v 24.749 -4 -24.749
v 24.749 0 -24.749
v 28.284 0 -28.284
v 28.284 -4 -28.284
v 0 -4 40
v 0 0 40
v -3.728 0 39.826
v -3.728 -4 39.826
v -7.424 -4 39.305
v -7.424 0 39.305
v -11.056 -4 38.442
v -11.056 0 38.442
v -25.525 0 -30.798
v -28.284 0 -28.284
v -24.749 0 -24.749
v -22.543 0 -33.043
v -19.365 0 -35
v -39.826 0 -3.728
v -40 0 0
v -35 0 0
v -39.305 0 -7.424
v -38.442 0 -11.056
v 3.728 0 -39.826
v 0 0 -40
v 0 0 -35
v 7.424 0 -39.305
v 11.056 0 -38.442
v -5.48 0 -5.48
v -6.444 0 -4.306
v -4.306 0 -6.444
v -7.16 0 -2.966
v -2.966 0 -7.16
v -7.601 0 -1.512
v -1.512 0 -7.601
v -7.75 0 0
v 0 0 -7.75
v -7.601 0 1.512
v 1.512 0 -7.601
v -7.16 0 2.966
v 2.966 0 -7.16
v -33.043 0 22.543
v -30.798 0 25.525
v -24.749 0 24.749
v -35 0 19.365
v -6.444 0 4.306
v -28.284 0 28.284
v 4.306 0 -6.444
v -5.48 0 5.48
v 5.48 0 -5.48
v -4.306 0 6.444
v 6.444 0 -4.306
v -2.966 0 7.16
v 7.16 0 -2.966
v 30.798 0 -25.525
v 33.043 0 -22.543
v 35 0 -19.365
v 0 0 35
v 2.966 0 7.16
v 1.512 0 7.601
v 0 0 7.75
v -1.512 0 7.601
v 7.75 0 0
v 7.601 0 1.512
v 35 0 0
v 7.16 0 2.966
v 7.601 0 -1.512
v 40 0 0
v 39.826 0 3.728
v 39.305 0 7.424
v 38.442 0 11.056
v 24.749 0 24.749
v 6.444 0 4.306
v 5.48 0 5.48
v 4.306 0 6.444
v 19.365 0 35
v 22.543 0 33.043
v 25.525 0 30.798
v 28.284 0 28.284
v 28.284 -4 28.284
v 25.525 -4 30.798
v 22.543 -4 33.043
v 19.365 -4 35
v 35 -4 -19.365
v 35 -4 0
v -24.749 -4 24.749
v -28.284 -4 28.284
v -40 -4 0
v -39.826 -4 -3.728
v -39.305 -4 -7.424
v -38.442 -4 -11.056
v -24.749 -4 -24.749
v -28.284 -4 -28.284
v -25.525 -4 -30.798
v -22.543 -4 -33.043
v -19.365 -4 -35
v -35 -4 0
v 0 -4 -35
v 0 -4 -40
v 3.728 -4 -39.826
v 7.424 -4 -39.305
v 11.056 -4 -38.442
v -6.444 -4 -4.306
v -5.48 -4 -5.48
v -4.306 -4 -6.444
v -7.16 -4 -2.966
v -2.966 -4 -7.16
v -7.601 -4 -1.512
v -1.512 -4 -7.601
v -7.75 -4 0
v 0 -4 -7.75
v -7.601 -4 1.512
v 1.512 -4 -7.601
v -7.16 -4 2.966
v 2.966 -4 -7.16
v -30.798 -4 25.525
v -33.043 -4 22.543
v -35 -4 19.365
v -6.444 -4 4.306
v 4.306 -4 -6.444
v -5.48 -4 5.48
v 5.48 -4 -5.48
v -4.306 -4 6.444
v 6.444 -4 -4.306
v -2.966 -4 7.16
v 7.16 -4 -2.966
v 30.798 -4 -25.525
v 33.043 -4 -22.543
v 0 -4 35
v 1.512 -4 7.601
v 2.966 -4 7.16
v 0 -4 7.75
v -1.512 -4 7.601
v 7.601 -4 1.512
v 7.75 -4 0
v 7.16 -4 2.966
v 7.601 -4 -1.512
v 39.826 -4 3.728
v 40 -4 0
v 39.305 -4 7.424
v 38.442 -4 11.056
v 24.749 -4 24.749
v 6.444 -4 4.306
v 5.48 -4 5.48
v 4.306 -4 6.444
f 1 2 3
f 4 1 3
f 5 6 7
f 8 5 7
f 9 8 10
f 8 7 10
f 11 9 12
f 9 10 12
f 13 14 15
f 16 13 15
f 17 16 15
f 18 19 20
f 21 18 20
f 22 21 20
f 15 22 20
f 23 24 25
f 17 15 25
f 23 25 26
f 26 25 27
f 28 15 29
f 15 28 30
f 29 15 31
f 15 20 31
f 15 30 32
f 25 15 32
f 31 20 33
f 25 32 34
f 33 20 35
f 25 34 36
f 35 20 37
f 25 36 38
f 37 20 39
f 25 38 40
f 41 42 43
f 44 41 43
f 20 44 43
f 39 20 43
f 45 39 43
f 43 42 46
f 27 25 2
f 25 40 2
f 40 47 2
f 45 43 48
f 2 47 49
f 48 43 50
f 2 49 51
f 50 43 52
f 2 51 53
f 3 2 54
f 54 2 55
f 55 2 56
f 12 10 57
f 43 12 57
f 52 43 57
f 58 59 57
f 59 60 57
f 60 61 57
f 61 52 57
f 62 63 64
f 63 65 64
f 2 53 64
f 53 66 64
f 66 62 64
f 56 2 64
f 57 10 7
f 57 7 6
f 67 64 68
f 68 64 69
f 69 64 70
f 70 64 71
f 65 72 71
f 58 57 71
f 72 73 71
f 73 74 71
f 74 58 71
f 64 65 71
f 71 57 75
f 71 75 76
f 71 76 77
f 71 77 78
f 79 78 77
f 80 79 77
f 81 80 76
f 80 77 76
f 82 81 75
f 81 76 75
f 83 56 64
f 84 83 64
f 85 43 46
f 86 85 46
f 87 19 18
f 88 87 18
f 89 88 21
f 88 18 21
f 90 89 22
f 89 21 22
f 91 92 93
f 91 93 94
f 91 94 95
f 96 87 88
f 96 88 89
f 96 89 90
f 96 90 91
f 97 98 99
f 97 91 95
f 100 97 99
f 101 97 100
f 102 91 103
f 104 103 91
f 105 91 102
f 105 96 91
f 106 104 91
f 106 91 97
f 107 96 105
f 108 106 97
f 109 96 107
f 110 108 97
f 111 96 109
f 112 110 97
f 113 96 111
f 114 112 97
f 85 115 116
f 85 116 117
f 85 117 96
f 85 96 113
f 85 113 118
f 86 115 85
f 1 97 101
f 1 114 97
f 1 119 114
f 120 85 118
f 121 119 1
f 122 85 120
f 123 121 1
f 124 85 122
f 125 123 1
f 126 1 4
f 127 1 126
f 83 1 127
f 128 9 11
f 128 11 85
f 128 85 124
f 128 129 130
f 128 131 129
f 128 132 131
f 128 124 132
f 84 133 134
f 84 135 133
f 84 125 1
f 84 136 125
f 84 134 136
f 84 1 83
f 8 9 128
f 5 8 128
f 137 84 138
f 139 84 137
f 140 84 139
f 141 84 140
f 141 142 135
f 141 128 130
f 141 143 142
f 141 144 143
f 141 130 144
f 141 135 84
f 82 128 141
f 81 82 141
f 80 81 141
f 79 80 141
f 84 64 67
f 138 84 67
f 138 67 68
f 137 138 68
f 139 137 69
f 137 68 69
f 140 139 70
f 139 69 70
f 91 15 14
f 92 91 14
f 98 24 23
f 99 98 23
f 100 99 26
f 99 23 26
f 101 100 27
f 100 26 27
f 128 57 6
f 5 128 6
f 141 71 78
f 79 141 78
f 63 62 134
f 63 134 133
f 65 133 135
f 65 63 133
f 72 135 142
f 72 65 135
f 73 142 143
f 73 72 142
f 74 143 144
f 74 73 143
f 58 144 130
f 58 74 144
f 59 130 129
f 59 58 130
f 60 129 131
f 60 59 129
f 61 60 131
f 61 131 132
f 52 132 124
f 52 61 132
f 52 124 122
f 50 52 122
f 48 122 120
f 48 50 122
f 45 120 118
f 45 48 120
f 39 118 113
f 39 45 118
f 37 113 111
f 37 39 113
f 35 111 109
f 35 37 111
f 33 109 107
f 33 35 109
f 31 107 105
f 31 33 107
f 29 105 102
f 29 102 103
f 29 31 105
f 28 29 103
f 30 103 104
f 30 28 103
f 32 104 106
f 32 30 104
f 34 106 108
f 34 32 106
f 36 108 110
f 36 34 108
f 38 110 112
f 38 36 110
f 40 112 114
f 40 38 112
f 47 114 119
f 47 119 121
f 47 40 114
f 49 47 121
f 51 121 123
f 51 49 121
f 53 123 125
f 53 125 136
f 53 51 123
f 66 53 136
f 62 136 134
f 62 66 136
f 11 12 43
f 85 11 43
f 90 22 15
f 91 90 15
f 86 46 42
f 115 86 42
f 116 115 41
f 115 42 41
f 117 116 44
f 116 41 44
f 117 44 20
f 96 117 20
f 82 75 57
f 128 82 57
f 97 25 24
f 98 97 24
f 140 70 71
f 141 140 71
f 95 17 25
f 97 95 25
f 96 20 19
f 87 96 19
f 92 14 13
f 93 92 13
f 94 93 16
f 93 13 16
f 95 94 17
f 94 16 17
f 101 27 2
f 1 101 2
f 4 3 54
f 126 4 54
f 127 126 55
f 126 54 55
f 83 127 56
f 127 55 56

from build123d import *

# Parameters (mm, degrees)
F0_R     = 7.75
F1_DEPTH = 4


with BuildPart() as f1:
    # F0 (on Front) → F1 (new body)
    with BuildSketch(Plane.XZ):
        with BuildLine():
            ThreePointArc((24.748737, -24.748737), (32.335784, -13.39392), (35, 0))
            ThreePointArc((35, 0), (32.335784, 13.39392), (24.748737, 24.748737))
            ThreePointArc((24.748737, 24.748737), (13.39392, 32.335784), (0, 35))
            ThreePointArc((0, 35), (-13.39392, 32.335784), (-24.748737, 24.748737))
            ThreePointArc((-24.748737, 24.748737), (-32.335784, 13.39392), (-35, 0))
            ThreePointArc((-35, 0), (-32.335784, -13.39392), (-24.748737, -24.748737))
            ThreePointArc((-24.748737, -24.748737), (-13.39392, -32.335784), (0, -35))
            ThreePointArc((0, -35), (13.39392, -32.335784), (24.748737, -24.748737))
        make_face()
        Circle(F0_R, mode=Mode.SUBTRACT)
        with BuildLine():
            ThreePointArc((-35, 0), (-32.335784, 13.39392), (-24.748737, 24.748737))
            Line((-24.748737, 24.748737), (-28.284271, 28.284271))
            ThreePointArc((-28.284271, 28.284271), (-31.954866, 24.060061), (-35, 19.364917))
            Line((-35, 19.364917), (-35, 0))
        make_face()
        with BuildLine():
            ThreePointArc((-24.748737, 24.748737), (-13.39392, 32.335784), (0, 35))
            Line((0, 35), (0, 40))
            ThreePointArc((0, 40), (-5.58247, 39.608535), (-11.055673, 38.441801))
            Line((-11.055673, 38.441801), (-24.748737, 24.748737))
        make_face()
        with BuildLine():
            Line((24.748737, 24.748737), (28.284271, 28.284271))
            ThreePointArc((28.284271, 28.284271), (24.060061, 31.954866), (19.364917, 35))
            Line((19.364917, 35), (0, 35))
            ThreePointArc((0, 35), (13.39392, 32.335784), (24.748737, 24.748737))
        make_face()
        with BuildLine():
            Line((35, 0), (40, 0))
            ThreePointArc((40, 0), (39.608535, 5.58247), (38.441801, 11.055673))
            Line((38.441801, 11.055673), (24.748737, 24.748737))
            ThreePointArc((24.748737, 24.748737), (32.335784, 13.39392), (35, 0))
        make_face()
        with BuildLine():
            ThreePointArc((28.284271, -28.284271), (31.954866, -24.060061), (35, -19.364917))
            Line((35, -19.364917), (35, 0))
            ThreePointArc((35, 0), (32.335784, -13.39392), (24.748737, -24.748737))
            Line((24.748737, -24.748737), (28.284271, -28.284271))
        make_face()
        with BuildLine():
            Line((11.055673, -38.441801), (24.748737, -24.748737))
            ThreePointArc((24.748737, -24.748737), (13.39392, -32.335784), (0, -35))
            Line((0, -35), (0, -40))
            ThreePointArc((0, -40), (5.58247, -39.608535), (11.055673, -38.441801))
        make_face()
        with BuildLine():
            Line((-19.364917, -35), (0, -35))
            ThreePointArc((0, -35), (-13.39392, -32.335784), (-24.748737, -24.748737))
            Line((-24.748737, -24.748737), (-28.284271, -28.284271))
            ThreePointArc((-28.284271, -28.284271), (-24.060061, -31.954866), (-19.364917, -35))
        make_face()
        with BuildLine():
            Line((-38.441801, -11.055673), (-24.748737, -24.748737))
            ThreePointArc((-24.748737, -24.748737), (-32.335784, -13.39392), (-35, 0))
            Line((-35, 0), (-40, 0))
            ThreePointArc((-40, 0), (-39.608535, -5.58247), (-38.441801, -11.055673))
        make_face()
    extrude(amount=F1_DEPTH)


solid = f1.part
